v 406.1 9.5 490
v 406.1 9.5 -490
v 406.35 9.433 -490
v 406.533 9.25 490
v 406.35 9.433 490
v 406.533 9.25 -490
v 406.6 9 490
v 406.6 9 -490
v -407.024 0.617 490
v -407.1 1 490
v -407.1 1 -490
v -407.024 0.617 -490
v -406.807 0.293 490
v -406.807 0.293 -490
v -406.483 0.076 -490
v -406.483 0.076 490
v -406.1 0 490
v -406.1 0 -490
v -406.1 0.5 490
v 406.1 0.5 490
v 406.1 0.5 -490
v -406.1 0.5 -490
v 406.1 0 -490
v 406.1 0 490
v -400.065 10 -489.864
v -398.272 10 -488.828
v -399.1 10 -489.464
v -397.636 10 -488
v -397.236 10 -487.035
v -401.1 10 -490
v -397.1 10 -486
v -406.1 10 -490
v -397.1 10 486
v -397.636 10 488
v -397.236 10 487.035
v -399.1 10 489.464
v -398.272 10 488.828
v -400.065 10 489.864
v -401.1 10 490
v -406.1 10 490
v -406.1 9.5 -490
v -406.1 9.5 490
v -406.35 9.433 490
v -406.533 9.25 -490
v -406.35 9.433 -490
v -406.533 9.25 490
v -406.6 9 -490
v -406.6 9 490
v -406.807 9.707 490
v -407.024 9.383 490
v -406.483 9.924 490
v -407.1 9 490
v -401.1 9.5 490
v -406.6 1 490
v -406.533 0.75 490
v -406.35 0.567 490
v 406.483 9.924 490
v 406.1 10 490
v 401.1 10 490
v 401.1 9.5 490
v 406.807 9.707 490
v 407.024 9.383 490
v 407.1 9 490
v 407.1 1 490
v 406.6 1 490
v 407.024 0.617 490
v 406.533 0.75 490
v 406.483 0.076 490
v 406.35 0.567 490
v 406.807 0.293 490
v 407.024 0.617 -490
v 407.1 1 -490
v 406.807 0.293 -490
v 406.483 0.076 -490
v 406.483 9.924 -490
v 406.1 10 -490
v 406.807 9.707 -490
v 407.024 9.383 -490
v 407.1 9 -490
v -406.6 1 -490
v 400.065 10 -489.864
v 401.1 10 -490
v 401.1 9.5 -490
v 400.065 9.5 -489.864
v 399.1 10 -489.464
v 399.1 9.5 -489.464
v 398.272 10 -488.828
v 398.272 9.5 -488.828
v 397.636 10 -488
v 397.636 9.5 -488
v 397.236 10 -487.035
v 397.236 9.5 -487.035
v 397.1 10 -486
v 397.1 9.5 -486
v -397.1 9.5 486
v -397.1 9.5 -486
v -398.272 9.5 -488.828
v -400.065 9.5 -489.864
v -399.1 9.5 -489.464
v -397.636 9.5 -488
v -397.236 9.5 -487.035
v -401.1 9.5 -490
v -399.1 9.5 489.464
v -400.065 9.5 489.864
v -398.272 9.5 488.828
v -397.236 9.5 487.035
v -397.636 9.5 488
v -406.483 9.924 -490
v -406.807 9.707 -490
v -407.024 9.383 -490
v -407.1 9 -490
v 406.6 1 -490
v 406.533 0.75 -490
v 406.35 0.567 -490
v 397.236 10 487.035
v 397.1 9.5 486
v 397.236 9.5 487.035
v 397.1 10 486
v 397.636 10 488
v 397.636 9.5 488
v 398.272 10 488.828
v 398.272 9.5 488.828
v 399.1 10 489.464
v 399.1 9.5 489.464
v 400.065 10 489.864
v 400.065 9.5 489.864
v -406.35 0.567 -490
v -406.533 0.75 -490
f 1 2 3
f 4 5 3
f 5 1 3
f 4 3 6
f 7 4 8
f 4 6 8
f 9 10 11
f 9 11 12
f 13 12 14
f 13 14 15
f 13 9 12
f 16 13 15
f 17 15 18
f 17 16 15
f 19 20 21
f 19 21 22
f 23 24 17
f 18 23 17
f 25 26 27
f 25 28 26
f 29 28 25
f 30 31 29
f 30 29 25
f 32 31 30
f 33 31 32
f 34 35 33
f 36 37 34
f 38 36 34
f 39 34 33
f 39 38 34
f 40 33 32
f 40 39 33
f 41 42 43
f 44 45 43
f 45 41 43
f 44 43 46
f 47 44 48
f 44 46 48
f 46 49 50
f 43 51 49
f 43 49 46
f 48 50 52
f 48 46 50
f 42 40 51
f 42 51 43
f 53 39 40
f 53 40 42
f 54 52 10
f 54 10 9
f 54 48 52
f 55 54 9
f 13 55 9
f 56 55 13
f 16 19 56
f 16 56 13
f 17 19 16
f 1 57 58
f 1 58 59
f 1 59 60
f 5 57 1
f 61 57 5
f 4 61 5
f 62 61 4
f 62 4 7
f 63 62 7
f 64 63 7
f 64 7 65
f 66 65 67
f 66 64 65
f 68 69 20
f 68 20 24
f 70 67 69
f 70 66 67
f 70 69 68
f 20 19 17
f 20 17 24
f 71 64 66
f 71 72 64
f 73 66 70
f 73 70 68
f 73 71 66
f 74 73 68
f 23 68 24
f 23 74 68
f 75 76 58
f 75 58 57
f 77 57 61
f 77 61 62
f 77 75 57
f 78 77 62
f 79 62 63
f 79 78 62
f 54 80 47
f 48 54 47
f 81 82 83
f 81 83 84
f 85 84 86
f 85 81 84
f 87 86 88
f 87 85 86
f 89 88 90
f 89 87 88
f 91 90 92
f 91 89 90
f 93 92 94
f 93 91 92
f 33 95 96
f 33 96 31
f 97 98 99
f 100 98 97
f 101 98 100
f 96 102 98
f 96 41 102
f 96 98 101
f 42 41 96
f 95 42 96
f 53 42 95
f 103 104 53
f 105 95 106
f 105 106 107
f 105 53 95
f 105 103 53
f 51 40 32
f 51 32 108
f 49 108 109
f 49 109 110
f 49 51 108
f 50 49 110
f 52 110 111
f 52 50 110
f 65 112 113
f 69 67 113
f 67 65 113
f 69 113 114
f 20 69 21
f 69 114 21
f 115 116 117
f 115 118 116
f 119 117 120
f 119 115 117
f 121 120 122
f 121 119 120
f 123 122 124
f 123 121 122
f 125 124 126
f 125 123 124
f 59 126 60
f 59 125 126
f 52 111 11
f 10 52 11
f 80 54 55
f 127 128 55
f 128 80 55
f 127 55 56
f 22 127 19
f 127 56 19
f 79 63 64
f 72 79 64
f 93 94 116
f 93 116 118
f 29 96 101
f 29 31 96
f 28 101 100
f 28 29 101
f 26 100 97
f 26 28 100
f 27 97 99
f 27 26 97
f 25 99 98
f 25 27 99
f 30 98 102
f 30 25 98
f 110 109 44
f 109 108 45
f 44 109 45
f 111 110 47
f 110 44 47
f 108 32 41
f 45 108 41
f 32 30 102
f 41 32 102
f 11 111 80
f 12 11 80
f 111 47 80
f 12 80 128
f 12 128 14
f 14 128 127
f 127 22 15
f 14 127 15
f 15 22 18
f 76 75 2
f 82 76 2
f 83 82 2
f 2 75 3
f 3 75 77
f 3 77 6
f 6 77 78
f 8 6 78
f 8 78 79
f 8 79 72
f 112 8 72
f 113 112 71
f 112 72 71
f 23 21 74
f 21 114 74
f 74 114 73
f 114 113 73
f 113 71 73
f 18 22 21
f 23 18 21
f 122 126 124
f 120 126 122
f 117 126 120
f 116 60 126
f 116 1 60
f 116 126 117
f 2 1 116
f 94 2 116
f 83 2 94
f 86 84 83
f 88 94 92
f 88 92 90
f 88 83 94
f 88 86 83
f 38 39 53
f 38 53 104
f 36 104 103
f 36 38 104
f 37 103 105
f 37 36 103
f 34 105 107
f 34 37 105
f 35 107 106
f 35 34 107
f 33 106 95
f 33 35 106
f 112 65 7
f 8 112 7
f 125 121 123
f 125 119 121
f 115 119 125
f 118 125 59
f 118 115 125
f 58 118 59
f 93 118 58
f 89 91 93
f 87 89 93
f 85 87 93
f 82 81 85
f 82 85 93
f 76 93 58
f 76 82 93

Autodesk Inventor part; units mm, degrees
ref_plane "YZ Plane" through (0, 0, 0) normal (1, 0, 0) x (0, 1, 0)
ref_plane "XZ Plane" through (0, 0, 0) normal (0, 1, 0) x (-1, 0, 0)
ref_plane "XY Plane" through (0, 0, 0) normal (0, 0, 1) x (1, 0, 0)
sketch "Sketch6" plane through (0, 0, 0) normal (0, 1, 0) x (-1, 0, 0)
  line L0 (407.1, -490) -> (-407.1, -490)
  line L1 (-407.1, -490) -> (-407.1, 490)
  line L2 (-407.1, 490) -> (407.1, 490)
  line L3 (407.1, 490) -> (407.1, -490)
  line L4 (407.1, -490) -> (-407.1, 490) construction
  line L5 (-407.1, -490) -> (407.1, 490) construction
  point P0 (0, 0)
  dimension "d52" = 814.2
  dimension "d53" = 980
extrude "Plate2" add sketch "Sketch6" along normal blind 0.5
sketch "Sketch11" plane through (406.6, 0, -490) normal (1, 0, 0) x (0, 1, 0)
  line L0 (0, 980) -> (0, 0)
  line L1 (0, 0) -> (10, 0)
  line L2 (10, 0) -> (10, 980)
  line L3 (10, 980) -> (0, 980)
edge flange "Flange2" height 10 angle 90 thickness 0.5 bend radius 0.5 thickness toward (1, 0, 0) relief tear relief width 0.5 relief depth 0.25 edges at (407.1, 0.5, 0) wall of the first edge with corners at (406.6, 0, 490) (406.6, 0, -490) (406.6, 10, -490) (406.6, 10, 490)
bend "Bend3"
corner "Corner3"
sketch "Sketch12" plane through (407.1, 9.5, -490) normal (0, 1, 0) x (-1, 0, 0)
  line L0 (0, 980) -> (0, 0)
  line L1 (0, 0) -> (10, 0)
  line L2 (10, 0) -> (10, 980)
  line L3 (10, 980) -> (0, 980)
edge flange "Flange3" height 10 angle 90 thickness 0.5 bend radius 0.5 thickness toward (0, 1, 0) relief tear relief width 0.5 relief depth 0.25 edges at (406.6, 10, 0) wall of the first edge with corners at (407.1, 9.5, 490) (407.1, 9.5, -490) (397.1, 9.5, -490) (397.1, 9.5, 490)
bend "Bend4"
corner "Corner4"
sketch "Sketch13" plane through (-406.6, 0, 490) normal (-1, 0, 0) x (0, -1, 0)
  line L0 (0, -980) -> (0, 0)
  line L1 (0, 0) -> (-10, 0)
  line L2 (-10, 0) -> (-10, -980)
  line L3 (-10, -980) -> (0, -980)
edge flange "Flange4" height 10 angle 90 thickness 0.5 bend radius 0.5 thickness toward (-1, 0, 0) relief tear relief width 0.5 relief depth 0.25 edges at (-407.1, 0.5, 0) wall of the first edge with corners at (-406.6, 0, -490) (-406.6, 0, 490) (-406.6, 10, 490) (-406.6, 10, -490)
bend "Bend5"
corner "Corner5"
sketch "Sketch14" plane through (-407.1, 9.5, 490) normal (0, 1, 0) x (-1, 0, 0)
  line L0 (0, -980) -> (0, 0)
  line L1 (0, 0) -> (-10, 0)
  line L2 (-10, 0) -> (-10, -980)
  line L3 (-10, -980) -> (0, -980)
edge flange "Flange5" height 10 angle 90 thickness 0.5 bend radius 0.5 thickness toward (0, 1, 0) relief tear relief width 0.5 relief depth 0.25 edges at (-406.6, 10, 0) wall of the first edge with corners at (-407.1, 9.5, -490) (-407.1, 9.5, 490) (-397.1, 9.5, 490) (-397.1, 9.5, -490)
bend "Bend6"
corner "Corner6"
fillet "Corner Round1" radius 4 1 edges at (397.1, 9.75, 490)
fillet "Corner Round2" radius 4 1 edges at (397.1, 9.75, -490)
fillet "Corner Round3" radius 4 1 edges at (-397.1, 9.75, -490)
fillet "Corner Round4" radius 4 1 edges at (-397.1, 9.75, 490)
equation "\"d52\" = ЖАБРЫ_базовая_ширина - ЖАБРЫ_шаг_листов"
equation "\"d53\" = ЖАБРЫ_базовая_длина_кор_лист"
equation "\"d54\" = Thickness"
equation "\"d84\" = BendReliefWidth"
equation "\"d85\" = BendReliefDepth"
equation "\"d86\" = MinimumRemnant"
equation "\"d87\" = TransitionRadius"
equation "\"d90\" = BendRadius"
equation "\"d91\" = CornerReliefSize"
equation "\"d92\" = GapSize"
equation "\"d93\" = JacobiRadiusSize"
equation "\"d94\" = BendReliefWidth"
equation "\"d95\" = BendReliefDepth"
equation "\"d96\" = MinimumRemnant"
equation "\"d97\" = TransitionRadius"
equation "\"d100\" = BendRadius"
equation "\"d101\" = CornerReliefSize"
equation "\"d102\" = GapSize"
equation "\"d103\" = JacobiRadiusSize"
equation "\"d104\" = BendReliefWidth"
equation "\"d105\" = BendReliefDepth"
equation "\"d106\" = MinimumRemnant"
equation "\"d107\" = TransitionRadius"
equation "\"d110\" = BendRadius"
equation "\"d111\" = CornerReliefSize"
equation "\"d112\" = GapSize"
equation "\"d113\" = JacobiRadiusSize"
equation "\"d114\" = BendReliefWidth"
equation "\"d115\" = BendReliefDepth"
equation "\"d116\" = MinimumRemnant"
equation "\"d117\" = TransitionRadius"
equation "\"d120\" = BendRadius"
equation "\"d121\" = CornerReliefSize"
equation "\"d122\" = GapSize"
equation "\"d123\" = JacobiRadiusSize"
equation "\"BendRadius\" = Thickness"
equation "\"BendReliefWidth\" = Thickness"
equation "\"BendReliefDepth\" = 0.5 * Thickness"
equation "\"CornerReliefSize\" = 4 * Thickness"
equation "\"MinimumRemnant\" = 2 * Thickness"
equation "\"TransitionRadius\" = BendRadius"
equation "\"JacobiRadiusSize\" = BendRadius"
equation "\"GapSize\" = Thickness"
equation "\"ЖАБРЫ_базовая_ширина\" = 915"
equation "\"ЖАБРЫ_шаг_листов\" = 100.8"
equation "\"ЖАБРЫ_базовая_длина_кор_лист\" = 980"
equation "\"Thickness\" = 0.5"
properties part number "MSC 805 SHEET GILLS" material "Stainless Steel"
